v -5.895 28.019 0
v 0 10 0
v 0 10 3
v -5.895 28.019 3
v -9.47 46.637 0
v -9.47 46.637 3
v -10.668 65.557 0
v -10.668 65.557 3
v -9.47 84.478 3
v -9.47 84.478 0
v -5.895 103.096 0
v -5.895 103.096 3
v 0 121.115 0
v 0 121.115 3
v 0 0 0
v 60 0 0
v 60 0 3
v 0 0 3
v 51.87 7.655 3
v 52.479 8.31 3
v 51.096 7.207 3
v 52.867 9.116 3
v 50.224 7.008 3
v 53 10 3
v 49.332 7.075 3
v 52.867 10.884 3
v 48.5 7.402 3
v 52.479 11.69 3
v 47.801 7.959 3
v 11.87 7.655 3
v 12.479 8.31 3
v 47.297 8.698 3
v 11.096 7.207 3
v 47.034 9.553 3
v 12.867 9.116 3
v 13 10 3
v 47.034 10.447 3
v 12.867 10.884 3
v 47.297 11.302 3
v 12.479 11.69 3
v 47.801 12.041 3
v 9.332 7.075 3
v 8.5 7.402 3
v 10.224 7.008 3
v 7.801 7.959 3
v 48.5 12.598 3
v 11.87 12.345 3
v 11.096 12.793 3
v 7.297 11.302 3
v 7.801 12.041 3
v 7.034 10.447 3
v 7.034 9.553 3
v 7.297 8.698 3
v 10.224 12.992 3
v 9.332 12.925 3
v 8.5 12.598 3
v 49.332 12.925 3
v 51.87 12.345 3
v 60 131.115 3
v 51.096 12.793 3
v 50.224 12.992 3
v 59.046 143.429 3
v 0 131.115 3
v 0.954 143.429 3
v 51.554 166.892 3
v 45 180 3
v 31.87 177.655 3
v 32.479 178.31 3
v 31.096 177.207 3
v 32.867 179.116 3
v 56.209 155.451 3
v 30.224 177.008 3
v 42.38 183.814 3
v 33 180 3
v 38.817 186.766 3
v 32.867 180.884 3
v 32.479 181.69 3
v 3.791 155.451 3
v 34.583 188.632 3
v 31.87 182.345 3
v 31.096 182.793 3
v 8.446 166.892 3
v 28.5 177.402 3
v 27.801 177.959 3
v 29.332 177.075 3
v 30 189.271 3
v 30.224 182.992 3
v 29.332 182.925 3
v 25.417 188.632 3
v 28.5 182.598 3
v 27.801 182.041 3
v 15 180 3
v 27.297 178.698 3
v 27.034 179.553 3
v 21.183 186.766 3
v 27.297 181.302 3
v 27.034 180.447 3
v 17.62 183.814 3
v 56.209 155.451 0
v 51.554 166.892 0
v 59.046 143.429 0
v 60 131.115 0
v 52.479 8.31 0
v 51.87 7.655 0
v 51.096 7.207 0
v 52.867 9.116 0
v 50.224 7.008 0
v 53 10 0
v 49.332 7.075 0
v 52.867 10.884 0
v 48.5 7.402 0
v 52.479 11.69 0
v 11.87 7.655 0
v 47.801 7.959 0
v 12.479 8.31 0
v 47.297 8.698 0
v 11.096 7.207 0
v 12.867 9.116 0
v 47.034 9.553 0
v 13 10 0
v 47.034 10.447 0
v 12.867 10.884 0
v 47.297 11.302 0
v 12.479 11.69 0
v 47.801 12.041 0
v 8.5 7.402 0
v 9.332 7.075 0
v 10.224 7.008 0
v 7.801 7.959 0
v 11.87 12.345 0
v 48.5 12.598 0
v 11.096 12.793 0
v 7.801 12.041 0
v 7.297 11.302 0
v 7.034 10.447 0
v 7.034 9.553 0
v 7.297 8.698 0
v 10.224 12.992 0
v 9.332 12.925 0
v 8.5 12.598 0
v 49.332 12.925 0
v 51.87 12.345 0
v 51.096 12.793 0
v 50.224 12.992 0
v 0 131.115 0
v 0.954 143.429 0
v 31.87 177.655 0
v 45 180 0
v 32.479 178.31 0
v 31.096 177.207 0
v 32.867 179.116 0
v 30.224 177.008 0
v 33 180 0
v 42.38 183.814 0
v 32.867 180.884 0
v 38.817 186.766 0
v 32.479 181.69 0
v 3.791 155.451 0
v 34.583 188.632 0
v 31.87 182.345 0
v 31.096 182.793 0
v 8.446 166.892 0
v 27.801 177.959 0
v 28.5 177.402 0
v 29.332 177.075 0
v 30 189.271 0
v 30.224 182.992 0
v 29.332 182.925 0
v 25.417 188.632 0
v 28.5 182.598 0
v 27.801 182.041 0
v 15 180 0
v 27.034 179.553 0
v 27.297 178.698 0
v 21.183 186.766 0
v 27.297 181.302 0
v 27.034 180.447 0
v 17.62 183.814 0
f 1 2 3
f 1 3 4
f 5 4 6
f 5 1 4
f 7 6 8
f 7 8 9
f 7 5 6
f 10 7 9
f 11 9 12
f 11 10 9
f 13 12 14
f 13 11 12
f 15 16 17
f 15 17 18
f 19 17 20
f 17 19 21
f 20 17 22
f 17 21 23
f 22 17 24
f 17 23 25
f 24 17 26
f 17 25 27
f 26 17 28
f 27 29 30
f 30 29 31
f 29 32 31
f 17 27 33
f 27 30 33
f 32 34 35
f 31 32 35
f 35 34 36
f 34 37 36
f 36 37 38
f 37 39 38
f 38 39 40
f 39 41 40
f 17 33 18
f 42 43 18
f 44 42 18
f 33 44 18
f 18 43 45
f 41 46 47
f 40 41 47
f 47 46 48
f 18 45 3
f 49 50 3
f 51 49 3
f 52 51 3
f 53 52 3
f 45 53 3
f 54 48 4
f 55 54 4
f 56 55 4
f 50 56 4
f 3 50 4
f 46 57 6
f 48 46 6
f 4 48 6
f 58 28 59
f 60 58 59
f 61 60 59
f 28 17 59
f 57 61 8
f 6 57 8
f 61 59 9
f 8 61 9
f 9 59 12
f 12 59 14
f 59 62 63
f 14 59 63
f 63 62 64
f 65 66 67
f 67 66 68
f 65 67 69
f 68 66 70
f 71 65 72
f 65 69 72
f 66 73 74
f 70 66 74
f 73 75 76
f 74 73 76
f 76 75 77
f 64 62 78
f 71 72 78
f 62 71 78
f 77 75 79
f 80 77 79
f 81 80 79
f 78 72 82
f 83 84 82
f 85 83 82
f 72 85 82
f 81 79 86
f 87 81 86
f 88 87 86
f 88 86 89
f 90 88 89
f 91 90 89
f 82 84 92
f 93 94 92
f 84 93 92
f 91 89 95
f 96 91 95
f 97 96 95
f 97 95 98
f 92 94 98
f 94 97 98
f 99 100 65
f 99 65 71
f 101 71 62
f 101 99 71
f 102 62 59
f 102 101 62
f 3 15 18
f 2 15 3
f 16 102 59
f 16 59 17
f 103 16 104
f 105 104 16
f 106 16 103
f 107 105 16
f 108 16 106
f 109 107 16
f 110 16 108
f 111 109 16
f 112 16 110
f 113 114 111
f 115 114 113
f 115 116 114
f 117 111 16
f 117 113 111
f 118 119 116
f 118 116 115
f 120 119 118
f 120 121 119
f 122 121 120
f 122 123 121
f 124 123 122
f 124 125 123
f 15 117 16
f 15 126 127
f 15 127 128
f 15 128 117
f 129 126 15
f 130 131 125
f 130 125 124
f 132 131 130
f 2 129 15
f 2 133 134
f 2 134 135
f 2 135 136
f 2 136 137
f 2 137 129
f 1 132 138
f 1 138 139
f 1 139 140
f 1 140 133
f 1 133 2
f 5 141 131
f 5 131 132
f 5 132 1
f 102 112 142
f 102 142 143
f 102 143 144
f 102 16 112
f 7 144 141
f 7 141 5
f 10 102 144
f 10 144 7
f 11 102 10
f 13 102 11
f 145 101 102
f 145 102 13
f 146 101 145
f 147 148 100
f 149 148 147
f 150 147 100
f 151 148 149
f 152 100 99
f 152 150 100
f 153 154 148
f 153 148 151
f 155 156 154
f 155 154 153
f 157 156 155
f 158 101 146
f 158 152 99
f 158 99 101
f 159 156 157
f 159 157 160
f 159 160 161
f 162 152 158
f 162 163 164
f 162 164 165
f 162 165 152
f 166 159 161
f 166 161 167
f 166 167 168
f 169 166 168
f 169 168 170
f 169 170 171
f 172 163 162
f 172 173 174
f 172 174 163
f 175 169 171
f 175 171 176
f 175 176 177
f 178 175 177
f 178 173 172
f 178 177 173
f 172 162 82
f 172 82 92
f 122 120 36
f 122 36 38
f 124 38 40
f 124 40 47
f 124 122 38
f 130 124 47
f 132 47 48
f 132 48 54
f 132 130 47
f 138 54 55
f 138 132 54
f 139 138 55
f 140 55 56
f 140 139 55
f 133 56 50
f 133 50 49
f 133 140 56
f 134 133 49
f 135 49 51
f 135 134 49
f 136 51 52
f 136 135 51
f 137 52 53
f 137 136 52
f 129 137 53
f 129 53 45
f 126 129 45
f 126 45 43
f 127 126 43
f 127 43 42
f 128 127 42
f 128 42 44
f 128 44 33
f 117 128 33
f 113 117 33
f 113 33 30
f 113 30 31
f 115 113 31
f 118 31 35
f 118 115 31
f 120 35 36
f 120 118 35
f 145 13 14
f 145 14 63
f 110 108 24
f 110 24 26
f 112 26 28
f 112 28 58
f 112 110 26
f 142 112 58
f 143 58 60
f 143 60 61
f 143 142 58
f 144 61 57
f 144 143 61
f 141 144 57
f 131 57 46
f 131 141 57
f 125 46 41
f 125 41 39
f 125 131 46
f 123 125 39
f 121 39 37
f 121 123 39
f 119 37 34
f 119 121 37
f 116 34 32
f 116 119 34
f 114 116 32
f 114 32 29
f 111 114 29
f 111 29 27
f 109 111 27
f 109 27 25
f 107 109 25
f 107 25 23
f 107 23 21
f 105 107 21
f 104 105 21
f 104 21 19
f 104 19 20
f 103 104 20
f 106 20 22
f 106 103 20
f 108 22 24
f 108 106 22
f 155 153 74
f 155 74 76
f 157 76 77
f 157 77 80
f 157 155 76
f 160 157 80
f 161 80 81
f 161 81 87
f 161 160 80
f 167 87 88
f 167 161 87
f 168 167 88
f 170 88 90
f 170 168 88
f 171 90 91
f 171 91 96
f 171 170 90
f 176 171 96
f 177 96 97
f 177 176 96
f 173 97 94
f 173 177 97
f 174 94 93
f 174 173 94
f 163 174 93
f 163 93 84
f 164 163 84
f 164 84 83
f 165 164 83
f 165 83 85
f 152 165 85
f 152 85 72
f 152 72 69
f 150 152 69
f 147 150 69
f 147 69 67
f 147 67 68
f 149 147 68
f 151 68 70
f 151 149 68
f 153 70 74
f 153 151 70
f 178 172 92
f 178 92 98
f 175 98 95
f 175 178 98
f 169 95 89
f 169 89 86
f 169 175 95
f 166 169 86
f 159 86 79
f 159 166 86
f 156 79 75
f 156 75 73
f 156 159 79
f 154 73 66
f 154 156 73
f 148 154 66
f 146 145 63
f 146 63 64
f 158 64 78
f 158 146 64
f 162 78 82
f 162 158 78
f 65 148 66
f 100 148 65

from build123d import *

# Parameters (mm, degrees)
SKETCH_1_R      = 3
EXTRUDE_1_DEPTH = 3


with BuildPart() as part:
    # 草图1 → 凸台-拉伸1 (new body)
    with BuildSketch(Plane.XY):
        with BuildLine():
            Line((8.44582472, 166.89164944), (15, 180))
            ThreePointArc((15, 180), (30, 189.270509831), (45, 180))
            Line((45, 180), (51.55417528, 166.89164944))
            ThreePointArc((51.55417528, 166.89164944), (57.859919157, 149.494795444), (60, 131.1145618))
            Line((60, 131.1145618), (60, 0))
            Line((60, 0), (0, 0))
            Line((0, 0), (0, 10))
            ThreePointArc((0, 10), (-10.668063464, 65.5572809), (0, 121.1145618))
            Line((0, 121.1145618), (0, 131.1145618))
            ThreePointArc((0, 131.1145618), (2.140080843, 149.494795444), (8.44582472, 166.89164944))
        make_face()
        with Locations((50, 10)):
            Circle(SKETCH_1_R, mode=Mode.SUBTRACT)
        with Locations((30, 180)):
            Circle(SKETCH_1_R, mode=Mode.SUBTRACT)
        with Locations((10, 10)):
            Circle(SKETCH_1_R, mode=Mode.SUBTRACT)
    extrude(amount=EXTRUDE_1_DEPTH)


solid = part.part
